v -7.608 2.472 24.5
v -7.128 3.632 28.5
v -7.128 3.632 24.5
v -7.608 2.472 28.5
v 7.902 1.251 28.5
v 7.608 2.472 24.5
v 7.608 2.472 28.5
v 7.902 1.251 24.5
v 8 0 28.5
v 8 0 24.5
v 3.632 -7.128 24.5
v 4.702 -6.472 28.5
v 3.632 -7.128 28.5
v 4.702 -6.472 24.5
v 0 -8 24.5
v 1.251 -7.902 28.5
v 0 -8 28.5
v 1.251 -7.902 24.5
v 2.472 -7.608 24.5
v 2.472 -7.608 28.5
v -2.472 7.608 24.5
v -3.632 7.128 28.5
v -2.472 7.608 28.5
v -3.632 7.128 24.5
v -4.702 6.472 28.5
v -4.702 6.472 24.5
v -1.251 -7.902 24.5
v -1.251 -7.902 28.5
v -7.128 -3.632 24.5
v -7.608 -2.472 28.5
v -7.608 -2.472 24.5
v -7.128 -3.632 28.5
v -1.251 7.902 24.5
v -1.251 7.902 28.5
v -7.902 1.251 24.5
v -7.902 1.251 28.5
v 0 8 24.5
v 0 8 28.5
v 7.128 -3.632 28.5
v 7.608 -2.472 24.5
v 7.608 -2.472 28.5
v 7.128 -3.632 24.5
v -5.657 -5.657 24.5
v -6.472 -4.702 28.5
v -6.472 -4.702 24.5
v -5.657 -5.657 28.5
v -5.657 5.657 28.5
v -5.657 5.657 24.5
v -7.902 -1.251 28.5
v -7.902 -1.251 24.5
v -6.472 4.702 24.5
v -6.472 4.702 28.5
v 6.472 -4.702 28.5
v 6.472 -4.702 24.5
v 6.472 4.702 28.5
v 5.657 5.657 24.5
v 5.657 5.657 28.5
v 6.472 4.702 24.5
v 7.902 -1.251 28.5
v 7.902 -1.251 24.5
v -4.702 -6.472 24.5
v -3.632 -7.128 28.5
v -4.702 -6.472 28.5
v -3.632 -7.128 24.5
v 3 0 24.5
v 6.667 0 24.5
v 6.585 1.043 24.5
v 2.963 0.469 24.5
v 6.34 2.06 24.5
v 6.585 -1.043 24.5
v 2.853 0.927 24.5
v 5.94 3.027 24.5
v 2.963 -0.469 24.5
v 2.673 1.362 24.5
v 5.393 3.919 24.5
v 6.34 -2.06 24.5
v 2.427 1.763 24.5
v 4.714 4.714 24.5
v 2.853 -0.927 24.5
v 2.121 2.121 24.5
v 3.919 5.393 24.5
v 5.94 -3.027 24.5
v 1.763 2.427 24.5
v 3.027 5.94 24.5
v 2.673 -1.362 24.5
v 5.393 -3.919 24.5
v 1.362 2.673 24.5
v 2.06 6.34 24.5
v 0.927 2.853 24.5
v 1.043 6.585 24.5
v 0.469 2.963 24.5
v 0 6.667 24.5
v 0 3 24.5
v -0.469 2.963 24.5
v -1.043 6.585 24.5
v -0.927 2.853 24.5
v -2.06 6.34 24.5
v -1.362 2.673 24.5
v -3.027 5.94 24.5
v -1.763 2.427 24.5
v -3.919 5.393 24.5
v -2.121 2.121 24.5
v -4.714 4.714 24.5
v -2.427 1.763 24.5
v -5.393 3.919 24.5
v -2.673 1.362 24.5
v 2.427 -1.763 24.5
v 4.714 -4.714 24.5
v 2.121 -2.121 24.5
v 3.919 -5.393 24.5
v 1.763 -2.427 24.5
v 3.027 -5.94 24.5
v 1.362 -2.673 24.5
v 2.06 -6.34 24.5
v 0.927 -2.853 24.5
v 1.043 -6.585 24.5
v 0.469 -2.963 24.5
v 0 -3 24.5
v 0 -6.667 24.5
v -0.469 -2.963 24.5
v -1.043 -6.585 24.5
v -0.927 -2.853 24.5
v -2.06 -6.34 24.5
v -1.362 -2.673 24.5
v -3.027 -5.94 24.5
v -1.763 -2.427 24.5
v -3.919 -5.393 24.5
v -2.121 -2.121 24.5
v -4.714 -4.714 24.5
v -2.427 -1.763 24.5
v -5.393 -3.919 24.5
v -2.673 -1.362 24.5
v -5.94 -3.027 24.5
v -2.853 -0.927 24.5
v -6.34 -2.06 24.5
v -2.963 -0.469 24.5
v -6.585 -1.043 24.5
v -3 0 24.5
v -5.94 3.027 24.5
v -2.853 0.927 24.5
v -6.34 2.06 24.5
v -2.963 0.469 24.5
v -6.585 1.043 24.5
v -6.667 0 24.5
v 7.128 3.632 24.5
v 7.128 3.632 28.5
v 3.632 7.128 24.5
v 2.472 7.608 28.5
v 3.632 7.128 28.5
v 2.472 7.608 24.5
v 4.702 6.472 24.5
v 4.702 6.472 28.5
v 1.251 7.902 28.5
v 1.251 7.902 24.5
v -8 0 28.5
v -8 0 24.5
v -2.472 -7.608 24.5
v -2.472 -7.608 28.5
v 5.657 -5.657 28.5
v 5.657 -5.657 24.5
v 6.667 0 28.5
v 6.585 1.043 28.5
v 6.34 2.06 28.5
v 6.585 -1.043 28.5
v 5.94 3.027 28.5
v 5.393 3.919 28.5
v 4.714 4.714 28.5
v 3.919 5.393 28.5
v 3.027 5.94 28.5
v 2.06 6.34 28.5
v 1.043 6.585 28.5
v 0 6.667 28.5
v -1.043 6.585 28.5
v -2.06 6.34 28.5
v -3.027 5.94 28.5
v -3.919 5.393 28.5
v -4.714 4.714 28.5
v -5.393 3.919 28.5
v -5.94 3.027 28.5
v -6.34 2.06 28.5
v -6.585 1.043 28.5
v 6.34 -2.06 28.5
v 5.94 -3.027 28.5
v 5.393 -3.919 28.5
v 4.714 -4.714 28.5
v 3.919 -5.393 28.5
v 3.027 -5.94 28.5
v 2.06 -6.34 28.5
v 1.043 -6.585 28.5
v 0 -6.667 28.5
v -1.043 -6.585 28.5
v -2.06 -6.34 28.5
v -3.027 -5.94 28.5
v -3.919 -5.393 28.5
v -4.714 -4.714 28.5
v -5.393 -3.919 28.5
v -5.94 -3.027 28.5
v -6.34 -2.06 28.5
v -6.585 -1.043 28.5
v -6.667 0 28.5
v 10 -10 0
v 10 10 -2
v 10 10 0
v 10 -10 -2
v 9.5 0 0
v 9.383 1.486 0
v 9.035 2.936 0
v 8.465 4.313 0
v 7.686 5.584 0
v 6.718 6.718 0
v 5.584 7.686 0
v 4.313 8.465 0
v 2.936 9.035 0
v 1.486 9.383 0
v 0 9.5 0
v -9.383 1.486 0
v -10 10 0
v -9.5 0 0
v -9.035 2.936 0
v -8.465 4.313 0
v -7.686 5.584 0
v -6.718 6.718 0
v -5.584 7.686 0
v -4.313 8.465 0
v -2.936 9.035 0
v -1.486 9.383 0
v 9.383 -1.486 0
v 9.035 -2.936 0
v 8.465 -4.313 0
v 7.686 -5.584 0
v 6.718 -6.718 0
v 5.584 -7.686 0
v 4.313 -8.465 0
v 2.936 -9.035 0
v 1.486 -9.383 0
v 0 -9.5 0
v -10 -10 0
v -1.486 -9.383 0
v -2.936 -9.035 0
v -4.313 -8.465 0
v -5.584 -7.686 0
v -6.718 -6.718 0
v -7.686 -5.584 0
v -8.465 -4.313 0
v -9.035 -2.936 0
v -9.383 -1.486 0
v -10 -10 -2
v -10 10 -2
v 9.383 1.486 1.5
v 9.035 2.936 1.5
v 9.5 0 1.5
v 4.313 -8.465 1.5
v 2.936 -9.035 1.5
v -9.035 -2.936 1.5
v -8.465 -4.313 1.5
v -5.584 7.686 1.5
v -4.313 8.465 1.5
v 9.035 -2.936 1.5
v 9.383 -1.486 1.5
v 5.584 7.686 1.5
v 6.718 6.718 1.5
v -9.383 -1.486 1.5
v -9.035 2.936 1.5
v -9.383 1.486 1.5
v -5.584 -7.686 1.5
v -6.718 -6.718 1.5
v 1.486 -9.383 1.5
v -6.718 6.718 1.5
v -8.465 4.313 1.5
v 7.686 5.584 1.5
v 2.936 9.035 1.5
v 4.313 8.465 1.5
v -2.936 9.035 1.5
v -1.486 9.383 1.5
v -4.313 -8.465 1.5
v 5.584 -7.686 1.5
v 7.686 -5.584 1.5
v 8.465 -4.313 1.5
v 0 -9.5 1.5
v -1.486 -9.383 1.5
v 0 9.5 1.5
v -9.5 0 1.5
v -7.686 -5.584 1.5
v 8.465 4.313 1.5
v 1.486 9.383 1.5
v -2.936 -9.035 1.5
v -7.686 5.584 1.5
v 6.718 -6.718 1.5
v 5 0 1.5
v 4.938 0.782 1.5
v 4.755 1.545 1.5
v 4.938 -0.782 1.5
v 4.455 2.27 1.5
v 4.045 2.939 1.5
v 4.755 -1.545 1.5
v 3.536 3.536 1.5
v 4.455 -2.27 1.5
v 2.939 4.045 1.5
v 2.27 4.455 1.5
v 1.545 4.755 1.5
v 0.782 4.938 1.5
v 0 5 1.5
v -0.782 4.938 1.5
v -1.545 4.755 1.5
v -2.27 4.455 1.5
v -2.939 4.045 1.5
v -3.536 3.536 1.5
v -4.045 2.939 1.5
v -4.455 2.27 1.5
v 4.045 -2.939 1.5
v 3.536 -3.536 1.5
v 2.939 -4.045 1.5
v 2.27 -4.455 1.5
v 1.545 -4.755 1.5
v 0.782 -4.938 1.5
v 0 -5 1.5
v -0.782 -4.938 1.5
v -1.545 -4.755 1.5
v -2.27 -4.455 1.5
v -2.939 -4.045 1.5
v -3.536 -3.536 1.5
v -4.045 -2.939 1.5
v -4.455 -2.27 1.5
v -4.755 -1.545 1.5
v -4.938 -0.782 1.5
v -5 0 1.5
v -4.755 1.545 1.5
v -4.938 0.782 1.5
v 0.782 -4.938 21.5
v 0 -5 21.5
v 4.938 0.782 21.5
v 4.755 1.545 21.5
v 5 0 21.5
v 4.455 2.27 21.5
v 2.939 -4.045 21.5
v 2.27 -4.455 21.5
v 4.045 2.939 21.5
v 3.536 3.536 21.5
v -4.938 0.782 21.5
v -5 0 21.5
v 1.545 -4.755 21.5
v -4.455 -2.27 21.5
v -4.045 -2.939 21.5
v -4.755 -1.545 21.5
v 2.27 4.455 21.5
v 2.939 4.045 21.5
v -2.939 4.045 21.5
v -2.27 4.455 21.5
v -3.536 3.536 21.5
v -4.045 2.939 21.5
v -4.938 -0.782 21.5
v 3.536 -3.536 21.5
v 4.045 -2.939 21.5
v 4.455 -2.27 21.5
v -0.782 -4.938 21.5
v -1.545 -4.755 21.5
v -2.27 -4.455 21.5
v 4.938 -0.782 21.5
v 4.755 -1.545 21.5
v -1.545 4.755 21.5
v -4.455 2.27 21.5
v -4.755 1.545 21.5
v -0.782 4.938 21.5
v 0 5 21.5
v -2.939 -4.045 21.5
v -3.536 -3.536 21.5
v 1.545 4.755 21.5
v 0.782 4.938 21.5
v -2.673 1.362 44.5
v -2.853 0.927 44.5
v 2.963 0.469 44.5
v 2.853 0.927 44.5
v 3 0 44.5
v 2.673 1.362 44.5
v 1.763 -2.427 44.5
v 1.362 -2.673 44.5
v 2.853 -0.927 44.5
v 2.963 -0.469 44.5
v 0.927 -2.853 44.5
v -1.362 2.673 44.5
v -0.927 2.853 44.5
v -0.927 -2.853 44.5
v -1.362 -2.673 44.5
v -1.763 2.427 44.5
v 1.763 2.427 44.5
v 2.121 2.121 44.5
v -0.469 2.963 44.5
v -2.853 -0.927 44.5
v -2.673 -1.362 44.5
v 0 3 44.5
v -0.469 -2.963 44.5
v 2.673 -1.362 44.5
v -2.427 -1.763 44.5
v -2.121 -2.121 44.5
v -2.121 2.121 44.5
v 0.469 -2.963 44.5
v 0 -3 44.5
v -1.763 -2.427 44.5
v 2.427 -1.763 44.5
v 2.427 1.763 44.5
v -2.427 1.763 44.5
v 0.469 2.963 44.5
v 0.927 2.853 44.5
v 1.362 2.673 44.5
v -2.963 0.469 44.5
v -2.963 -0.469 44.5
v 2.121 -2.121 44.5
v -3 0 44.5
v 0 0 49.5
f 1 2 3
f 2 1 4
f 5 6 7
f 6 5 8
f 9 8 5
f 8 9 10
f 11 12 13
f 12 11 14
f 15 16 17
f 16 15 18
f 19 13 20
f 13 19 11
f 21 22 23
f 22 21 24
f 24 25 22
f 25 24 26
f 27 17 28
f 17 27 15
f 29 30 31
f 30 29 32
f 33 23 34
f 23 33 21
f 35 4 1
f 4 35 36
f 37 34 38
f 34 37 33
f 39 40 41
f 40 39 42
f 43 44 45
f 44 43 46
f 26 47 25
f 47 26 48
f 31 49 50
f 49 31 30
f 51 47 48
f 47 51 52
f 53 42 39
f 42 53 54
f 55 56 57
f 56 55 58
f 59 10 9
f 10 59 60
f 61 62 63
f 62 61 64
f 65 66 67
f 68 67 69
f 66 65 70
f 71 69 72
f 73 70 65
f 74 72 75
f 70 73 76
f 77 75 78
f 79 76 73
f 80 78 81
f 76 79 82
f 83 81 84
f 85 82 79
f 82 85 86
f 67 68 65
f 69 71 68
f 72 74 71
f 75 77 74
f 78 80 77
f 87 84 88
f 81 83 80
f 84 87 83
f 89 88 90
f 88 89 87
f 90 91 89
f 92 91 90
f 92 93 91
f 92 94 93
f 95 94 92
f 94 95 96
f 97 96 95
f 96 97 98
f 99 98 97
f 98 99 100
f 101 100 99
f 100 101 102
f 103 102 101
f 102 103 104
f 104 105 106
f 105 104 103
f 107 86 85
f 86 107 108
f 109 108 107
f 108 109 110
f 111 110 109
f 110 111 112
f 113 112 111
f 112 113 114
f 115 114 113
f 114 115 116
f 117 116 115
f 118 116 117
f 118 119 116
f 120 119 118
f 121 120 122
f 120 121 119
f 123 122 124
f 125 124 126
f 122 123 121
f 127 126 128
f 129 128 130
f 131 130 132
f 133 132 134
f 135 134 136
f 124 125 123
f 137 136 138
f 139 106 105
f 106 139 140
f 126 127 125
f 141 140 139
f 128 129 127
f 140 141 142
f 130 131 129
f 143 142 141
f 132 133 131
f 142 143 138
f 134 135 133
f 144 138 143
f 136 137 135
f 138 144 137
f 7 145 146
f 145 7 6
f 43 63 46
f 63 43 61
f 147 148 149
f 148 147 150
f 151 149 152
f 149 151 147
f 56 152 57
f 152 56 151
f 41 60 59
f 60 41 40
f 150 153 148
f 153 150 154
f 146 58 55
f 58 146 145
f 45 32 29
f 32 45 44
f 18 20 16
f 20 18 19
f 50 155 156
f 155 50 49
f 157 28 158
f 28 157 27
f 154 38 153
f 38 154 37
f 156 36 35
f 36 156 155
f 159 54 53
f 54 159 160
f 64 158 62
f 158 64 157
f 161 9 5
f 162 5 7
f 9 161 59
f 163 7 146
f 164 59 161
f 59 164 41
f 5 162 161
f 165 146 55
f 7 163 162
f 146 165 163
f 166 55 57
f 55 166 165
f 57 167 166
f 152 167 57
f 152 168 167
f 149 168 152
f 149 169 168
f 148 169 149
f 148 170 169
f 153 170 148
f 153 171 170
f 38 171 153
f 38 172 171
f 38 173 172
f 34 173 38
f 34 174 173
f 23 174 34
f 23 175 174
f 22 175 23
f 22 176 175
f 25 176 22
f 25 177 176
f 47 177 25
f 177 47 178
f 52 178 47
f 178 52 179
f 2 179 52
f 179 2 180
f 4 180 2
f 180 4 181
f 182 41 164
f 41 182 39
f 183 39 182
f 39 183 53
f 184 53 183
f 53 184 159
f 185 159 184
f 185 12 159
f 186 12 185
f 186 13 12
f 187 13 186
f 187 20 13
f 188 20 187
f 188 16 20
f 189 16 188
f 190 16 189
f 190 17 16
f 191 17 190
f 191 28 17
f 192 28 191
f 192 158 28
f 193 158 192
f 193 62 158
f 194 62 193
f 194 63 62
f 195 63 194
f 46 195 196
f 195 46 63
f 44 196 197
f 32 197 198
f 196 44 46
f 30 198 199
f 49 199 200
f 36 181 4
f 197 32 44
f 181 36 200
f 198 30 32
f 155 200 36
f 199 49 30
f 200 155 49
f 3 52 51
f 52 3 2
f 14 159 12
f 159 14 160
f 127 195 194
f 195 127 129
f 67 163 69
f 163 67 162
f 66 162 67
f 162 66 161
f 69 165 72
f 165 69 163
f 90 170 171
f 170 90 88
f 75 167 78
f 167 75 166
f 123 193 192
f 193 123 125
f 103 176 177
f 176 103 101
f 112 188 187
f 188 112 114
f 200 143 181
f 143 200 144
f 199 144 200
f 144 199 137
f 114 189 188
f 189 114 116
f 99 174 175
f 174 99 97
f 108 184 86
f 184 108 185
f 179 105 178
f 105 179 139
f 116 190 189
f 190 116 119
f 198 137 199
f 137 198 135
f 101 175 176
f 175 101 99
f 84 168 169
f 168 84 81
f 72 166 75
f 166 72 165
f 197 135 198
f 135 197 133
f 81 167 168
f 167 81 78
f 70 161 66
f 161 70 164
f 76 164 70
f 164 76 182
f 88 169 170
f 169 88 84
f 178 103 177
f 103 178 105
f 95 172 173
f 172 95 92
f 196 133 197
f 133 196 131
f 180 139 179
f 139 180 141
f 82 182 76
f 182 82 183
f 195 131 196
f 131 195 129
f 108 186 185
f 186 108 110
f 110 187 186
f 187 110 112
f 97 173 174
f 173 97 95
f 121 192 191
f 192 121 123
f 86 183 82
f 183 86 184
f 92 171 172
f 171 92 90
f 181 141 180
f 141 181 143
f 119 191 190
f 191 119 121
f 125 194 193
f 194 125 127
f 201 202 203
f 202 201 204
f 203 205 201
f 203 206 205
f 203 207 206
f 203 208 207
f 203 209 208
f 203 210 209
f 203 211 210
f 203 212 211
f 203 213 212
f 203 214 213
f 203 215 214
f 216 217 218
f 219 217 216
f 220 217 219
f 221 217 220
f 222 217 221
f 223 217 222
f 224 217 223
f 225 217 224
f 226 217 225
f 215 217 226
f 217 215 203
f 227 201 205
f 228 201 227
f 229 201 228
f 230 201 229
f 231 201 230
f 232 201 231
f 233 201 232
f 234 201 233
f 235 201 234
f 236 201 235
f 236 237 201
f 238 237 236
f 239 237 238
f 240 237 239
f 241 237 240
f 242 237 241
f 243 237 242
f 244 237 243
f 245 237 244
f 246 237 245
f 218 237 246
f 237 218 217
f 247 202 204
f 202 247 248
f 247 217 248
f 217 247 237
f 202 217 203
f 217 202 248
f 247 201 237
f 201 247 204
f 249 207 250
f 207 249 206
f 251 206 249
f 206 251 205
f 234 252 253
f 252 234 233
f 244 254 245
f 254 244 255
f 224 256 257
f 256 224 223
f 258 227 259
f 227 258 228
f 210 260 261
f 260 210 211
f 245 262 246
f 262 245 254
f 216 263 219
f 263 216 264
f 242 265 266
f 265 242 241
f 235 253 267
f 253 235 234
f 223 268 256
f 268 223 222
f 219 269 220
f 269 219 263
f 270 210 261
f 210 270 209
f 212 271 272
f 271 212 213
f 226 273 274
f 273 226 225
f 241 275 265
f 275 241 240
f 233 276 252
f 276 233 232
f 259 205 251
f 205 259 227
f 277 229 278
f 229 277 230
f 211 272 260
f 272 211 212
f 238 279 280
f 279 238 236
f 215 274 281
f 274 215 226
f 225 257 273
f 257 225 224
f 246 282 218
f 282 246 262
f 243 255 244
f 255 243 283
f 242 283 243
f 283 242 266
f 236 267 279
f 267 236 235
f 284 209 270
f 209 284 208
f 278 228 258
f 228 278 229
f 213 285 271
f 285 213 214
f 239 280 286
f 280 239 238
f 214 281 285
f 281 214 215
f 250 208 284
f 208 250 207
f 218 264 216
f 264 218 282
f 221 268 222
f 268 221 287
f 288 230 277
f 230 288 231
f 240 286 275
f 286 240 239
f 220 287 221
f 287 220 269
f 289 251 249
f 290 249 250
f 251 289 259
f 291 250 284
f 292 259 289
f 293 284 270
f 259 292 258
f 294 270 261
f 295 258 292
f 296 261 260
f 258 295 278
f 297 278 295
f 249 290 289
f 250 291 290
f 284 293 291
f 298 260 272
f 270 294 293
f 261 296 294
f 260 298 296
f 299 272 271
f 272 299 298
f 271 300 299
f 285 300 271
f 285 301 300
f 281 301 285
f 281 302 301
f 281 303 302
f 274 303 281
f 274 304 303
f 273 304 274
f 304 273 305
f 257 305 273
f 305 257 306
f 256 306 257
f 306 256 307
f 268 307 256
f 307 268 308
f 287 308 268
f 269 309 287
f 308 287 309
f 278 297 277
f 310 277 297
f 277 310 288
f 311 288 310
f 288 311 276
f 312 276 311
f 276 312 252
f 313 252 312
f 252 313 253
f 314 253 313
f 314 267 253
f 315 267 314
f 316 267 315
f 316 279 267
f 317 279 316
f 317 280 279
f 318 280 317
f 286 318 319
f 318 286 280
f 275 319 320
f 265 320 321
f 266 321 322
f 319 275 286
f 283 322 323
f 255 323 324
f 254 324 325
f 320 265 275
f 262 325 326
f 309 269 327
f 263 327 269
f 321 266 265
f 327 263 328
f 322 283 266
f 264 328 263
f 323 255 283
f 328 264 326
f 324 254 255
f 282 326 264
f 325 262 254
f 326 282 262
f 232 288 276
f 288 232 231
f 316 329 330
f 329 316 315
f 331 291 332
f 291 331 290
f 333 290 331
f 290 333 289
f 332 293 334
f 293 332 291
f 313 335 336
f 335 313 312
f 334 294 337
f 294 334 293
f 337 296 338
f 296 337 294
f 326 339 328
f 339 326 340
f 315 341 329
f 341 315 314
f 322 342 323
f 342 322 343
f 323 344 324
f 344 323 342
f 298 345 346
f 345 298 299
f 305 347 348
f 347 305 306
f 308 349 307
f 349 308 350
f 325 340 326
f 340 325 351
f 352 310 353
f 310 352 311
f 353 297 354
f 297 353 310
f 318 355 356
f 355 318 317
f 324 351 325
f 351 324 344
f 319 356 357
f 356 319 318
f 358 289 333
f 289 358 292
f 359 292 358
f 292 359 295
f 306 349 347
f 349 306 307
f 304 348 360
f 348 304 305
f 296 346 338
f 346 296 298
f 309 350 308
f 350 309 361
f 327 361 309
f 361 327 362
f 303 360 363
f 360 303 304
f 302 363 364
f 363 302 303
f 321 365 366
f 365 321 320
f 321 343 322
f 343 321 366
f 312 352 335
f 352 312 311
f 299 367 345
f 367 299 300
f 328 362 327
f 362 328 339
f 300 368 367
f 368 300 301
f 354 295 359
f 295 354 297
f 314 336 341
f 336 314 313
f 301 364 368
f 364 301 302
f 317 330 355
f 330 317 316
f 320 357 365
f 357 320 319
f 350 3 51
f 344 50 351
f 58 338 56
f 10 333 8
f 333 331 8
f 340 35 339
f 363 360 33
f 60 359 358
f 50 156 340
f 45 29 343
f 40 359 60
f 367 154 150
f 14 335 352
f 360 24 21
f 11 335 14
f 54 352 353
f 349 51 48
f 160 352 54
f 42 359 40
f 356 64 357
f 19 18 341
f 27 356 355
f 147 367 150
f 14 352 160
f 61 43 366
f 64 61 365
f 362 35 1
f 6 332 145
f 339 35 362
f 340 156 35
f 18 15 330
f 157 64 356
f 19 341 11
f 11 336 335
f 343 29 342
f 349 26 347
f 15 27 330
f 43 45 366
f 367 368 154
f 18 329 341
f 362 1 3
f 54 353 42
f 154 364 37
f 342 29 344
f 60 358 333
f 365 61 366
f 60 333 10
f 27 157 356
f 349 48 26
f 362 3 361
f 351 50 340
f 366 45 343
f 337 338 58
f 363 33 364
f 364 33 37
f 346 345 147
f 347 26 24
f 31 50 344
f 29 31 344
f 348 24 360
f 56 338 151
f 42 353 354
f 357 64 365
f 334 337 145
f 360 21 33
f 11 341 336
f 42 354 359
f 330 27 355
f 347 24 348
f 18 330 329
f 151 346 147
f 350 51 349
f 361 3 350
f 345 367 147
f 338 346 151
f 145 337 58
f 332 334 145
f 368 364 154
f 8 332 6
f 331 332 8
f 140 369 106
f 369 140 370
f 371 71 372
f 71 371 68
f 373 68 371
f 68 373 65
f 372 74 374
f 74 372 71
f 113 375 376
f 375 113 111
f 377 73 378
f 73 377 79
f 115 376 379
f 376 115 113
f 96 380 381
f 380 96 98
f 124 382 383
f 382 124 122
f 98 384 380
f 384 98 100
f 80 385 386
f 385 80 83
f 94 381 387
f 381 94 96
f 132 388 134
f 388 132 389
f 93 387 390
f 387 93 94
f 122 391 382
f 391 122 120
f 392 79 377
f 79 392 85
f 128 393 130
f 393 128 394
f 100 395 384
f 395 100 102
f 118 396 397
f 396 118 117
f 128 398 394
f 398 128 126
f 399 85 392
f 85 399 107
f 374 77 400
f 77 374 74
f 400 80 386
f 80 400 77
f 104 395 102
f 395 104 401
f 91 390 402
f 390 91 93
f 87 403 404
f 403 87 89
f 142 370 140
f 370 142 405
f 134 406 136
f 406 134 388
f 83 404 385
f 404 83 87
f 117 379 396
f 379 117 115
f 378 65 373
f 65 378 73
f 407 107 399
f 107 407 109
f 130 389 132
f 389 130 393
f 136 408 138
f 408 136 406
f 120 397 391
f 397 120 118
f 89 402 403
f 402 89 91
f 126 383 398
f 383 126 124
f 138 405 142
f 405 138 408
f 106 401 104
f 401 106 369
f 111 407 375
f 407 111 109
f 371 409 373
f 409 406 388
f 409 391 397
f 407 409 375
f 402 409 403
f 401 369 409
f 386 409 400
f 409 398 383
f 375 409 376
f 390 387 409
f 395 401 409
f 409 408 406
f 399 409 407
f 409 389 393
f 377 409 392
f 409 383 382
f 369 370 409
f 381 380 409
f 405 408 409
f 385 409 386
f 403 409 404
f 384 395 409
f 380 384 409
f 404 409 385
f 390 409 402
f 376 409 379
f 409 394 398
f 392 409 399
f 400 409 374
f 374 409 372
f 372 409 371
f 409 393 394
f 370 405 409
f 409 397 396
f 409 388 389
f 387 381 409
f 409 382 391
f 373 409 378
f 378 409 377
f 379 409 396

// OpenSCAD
$fn=40; //[10,15,20,25,30,35,40,45,50]
bottomplate_thickness=2;	//[0:10]
bottomcircle_thickness=1.5; //[0.5:5]
firstlevel_hight=20;		//[5:40]
firstlevel_radius=5;		//[1:50]
secondlevel_hight=3;	//[0:10]
secondlevel_radius_top=firstlevel_radius+secondlevel_hight;
secondlevel_limit_hight=4;	//[0:10]
secondlevel_limit_thickness=secondlevel_limit_hight/3;
thirdlevel_hight=20;	//[0:50]
thirdlevel_radius=3;	//[0:50]
thirdlevel_top_hight=5;	//[0:50]

//bottom plate
translate(v=[0,0,-bottomplate_thickness/2])
	{
		cube(size=[20,20,bottomplate_thickness], center=true);
	}

//bottom circle plate
translate(v=[0,0,bottomcircle_thickness/2])
	{
		cylinder(h=bottomcircle_thickness, r=9.5, center=true);
	}

//first cylindrical level
translate(v=[0,0,firstlevel_hight/2+bottomcircle_thickness])
	{
		cylinder(h=firstlevel_hight, r=firstlevel_radius, center=true);
	}

//second level, angled cylinder
translate(v=[0,0,secondlevel_hight/2+firstlevel_hight+bottomcircle_thickness])
	{
		cylinder(h=secondlevel_hight, r1=firstlevel_radius, r2=secondlevel_radius_top, center=true);
	}

//second level limit
		translate(v=[0,0,secondlevel_limit_hight/2+secondlevel_hight+firstlevel_hight+bottomcircle_thickness])
	{	
		difference()
			{
				cylinder(h=secondlevel_limit_hight, r=secondlevel_radius_top, center=true);
		
				cylinder(h=secondlevel_limit_hight+0.1, r=secondlevel_radius_top-secondlevel_limit_thickness, center=true);
			}
	}
//third level
translate(v=[0,0,thirdlevel_hight/2+secondlevel_hight+firstlevel_hight+bottomcircle_thickness])
	{
		cylinder(h=thirdlevel_hight, r=thirdlevel_radius, center=true);
	}

//third level top
	translate(v=[0,0,thirdlevel_top_hight/2+thirdlevel_hight+secondlevel_hight+firstlevel_hight+bottomcircle_thickness])
	{
		cylinder(h=thirdlevel_top_hight, r1=thirdlevel_radius, r2=0, center=true);
	}





//union()
//{
//	translate(v=[0,0,-15])
		//{
			//cube(size = [15,15,30], center =true);
		//	cylinder(h=20, r=7.5);
	//	}	
//	sphere(r=7.5);
//}

